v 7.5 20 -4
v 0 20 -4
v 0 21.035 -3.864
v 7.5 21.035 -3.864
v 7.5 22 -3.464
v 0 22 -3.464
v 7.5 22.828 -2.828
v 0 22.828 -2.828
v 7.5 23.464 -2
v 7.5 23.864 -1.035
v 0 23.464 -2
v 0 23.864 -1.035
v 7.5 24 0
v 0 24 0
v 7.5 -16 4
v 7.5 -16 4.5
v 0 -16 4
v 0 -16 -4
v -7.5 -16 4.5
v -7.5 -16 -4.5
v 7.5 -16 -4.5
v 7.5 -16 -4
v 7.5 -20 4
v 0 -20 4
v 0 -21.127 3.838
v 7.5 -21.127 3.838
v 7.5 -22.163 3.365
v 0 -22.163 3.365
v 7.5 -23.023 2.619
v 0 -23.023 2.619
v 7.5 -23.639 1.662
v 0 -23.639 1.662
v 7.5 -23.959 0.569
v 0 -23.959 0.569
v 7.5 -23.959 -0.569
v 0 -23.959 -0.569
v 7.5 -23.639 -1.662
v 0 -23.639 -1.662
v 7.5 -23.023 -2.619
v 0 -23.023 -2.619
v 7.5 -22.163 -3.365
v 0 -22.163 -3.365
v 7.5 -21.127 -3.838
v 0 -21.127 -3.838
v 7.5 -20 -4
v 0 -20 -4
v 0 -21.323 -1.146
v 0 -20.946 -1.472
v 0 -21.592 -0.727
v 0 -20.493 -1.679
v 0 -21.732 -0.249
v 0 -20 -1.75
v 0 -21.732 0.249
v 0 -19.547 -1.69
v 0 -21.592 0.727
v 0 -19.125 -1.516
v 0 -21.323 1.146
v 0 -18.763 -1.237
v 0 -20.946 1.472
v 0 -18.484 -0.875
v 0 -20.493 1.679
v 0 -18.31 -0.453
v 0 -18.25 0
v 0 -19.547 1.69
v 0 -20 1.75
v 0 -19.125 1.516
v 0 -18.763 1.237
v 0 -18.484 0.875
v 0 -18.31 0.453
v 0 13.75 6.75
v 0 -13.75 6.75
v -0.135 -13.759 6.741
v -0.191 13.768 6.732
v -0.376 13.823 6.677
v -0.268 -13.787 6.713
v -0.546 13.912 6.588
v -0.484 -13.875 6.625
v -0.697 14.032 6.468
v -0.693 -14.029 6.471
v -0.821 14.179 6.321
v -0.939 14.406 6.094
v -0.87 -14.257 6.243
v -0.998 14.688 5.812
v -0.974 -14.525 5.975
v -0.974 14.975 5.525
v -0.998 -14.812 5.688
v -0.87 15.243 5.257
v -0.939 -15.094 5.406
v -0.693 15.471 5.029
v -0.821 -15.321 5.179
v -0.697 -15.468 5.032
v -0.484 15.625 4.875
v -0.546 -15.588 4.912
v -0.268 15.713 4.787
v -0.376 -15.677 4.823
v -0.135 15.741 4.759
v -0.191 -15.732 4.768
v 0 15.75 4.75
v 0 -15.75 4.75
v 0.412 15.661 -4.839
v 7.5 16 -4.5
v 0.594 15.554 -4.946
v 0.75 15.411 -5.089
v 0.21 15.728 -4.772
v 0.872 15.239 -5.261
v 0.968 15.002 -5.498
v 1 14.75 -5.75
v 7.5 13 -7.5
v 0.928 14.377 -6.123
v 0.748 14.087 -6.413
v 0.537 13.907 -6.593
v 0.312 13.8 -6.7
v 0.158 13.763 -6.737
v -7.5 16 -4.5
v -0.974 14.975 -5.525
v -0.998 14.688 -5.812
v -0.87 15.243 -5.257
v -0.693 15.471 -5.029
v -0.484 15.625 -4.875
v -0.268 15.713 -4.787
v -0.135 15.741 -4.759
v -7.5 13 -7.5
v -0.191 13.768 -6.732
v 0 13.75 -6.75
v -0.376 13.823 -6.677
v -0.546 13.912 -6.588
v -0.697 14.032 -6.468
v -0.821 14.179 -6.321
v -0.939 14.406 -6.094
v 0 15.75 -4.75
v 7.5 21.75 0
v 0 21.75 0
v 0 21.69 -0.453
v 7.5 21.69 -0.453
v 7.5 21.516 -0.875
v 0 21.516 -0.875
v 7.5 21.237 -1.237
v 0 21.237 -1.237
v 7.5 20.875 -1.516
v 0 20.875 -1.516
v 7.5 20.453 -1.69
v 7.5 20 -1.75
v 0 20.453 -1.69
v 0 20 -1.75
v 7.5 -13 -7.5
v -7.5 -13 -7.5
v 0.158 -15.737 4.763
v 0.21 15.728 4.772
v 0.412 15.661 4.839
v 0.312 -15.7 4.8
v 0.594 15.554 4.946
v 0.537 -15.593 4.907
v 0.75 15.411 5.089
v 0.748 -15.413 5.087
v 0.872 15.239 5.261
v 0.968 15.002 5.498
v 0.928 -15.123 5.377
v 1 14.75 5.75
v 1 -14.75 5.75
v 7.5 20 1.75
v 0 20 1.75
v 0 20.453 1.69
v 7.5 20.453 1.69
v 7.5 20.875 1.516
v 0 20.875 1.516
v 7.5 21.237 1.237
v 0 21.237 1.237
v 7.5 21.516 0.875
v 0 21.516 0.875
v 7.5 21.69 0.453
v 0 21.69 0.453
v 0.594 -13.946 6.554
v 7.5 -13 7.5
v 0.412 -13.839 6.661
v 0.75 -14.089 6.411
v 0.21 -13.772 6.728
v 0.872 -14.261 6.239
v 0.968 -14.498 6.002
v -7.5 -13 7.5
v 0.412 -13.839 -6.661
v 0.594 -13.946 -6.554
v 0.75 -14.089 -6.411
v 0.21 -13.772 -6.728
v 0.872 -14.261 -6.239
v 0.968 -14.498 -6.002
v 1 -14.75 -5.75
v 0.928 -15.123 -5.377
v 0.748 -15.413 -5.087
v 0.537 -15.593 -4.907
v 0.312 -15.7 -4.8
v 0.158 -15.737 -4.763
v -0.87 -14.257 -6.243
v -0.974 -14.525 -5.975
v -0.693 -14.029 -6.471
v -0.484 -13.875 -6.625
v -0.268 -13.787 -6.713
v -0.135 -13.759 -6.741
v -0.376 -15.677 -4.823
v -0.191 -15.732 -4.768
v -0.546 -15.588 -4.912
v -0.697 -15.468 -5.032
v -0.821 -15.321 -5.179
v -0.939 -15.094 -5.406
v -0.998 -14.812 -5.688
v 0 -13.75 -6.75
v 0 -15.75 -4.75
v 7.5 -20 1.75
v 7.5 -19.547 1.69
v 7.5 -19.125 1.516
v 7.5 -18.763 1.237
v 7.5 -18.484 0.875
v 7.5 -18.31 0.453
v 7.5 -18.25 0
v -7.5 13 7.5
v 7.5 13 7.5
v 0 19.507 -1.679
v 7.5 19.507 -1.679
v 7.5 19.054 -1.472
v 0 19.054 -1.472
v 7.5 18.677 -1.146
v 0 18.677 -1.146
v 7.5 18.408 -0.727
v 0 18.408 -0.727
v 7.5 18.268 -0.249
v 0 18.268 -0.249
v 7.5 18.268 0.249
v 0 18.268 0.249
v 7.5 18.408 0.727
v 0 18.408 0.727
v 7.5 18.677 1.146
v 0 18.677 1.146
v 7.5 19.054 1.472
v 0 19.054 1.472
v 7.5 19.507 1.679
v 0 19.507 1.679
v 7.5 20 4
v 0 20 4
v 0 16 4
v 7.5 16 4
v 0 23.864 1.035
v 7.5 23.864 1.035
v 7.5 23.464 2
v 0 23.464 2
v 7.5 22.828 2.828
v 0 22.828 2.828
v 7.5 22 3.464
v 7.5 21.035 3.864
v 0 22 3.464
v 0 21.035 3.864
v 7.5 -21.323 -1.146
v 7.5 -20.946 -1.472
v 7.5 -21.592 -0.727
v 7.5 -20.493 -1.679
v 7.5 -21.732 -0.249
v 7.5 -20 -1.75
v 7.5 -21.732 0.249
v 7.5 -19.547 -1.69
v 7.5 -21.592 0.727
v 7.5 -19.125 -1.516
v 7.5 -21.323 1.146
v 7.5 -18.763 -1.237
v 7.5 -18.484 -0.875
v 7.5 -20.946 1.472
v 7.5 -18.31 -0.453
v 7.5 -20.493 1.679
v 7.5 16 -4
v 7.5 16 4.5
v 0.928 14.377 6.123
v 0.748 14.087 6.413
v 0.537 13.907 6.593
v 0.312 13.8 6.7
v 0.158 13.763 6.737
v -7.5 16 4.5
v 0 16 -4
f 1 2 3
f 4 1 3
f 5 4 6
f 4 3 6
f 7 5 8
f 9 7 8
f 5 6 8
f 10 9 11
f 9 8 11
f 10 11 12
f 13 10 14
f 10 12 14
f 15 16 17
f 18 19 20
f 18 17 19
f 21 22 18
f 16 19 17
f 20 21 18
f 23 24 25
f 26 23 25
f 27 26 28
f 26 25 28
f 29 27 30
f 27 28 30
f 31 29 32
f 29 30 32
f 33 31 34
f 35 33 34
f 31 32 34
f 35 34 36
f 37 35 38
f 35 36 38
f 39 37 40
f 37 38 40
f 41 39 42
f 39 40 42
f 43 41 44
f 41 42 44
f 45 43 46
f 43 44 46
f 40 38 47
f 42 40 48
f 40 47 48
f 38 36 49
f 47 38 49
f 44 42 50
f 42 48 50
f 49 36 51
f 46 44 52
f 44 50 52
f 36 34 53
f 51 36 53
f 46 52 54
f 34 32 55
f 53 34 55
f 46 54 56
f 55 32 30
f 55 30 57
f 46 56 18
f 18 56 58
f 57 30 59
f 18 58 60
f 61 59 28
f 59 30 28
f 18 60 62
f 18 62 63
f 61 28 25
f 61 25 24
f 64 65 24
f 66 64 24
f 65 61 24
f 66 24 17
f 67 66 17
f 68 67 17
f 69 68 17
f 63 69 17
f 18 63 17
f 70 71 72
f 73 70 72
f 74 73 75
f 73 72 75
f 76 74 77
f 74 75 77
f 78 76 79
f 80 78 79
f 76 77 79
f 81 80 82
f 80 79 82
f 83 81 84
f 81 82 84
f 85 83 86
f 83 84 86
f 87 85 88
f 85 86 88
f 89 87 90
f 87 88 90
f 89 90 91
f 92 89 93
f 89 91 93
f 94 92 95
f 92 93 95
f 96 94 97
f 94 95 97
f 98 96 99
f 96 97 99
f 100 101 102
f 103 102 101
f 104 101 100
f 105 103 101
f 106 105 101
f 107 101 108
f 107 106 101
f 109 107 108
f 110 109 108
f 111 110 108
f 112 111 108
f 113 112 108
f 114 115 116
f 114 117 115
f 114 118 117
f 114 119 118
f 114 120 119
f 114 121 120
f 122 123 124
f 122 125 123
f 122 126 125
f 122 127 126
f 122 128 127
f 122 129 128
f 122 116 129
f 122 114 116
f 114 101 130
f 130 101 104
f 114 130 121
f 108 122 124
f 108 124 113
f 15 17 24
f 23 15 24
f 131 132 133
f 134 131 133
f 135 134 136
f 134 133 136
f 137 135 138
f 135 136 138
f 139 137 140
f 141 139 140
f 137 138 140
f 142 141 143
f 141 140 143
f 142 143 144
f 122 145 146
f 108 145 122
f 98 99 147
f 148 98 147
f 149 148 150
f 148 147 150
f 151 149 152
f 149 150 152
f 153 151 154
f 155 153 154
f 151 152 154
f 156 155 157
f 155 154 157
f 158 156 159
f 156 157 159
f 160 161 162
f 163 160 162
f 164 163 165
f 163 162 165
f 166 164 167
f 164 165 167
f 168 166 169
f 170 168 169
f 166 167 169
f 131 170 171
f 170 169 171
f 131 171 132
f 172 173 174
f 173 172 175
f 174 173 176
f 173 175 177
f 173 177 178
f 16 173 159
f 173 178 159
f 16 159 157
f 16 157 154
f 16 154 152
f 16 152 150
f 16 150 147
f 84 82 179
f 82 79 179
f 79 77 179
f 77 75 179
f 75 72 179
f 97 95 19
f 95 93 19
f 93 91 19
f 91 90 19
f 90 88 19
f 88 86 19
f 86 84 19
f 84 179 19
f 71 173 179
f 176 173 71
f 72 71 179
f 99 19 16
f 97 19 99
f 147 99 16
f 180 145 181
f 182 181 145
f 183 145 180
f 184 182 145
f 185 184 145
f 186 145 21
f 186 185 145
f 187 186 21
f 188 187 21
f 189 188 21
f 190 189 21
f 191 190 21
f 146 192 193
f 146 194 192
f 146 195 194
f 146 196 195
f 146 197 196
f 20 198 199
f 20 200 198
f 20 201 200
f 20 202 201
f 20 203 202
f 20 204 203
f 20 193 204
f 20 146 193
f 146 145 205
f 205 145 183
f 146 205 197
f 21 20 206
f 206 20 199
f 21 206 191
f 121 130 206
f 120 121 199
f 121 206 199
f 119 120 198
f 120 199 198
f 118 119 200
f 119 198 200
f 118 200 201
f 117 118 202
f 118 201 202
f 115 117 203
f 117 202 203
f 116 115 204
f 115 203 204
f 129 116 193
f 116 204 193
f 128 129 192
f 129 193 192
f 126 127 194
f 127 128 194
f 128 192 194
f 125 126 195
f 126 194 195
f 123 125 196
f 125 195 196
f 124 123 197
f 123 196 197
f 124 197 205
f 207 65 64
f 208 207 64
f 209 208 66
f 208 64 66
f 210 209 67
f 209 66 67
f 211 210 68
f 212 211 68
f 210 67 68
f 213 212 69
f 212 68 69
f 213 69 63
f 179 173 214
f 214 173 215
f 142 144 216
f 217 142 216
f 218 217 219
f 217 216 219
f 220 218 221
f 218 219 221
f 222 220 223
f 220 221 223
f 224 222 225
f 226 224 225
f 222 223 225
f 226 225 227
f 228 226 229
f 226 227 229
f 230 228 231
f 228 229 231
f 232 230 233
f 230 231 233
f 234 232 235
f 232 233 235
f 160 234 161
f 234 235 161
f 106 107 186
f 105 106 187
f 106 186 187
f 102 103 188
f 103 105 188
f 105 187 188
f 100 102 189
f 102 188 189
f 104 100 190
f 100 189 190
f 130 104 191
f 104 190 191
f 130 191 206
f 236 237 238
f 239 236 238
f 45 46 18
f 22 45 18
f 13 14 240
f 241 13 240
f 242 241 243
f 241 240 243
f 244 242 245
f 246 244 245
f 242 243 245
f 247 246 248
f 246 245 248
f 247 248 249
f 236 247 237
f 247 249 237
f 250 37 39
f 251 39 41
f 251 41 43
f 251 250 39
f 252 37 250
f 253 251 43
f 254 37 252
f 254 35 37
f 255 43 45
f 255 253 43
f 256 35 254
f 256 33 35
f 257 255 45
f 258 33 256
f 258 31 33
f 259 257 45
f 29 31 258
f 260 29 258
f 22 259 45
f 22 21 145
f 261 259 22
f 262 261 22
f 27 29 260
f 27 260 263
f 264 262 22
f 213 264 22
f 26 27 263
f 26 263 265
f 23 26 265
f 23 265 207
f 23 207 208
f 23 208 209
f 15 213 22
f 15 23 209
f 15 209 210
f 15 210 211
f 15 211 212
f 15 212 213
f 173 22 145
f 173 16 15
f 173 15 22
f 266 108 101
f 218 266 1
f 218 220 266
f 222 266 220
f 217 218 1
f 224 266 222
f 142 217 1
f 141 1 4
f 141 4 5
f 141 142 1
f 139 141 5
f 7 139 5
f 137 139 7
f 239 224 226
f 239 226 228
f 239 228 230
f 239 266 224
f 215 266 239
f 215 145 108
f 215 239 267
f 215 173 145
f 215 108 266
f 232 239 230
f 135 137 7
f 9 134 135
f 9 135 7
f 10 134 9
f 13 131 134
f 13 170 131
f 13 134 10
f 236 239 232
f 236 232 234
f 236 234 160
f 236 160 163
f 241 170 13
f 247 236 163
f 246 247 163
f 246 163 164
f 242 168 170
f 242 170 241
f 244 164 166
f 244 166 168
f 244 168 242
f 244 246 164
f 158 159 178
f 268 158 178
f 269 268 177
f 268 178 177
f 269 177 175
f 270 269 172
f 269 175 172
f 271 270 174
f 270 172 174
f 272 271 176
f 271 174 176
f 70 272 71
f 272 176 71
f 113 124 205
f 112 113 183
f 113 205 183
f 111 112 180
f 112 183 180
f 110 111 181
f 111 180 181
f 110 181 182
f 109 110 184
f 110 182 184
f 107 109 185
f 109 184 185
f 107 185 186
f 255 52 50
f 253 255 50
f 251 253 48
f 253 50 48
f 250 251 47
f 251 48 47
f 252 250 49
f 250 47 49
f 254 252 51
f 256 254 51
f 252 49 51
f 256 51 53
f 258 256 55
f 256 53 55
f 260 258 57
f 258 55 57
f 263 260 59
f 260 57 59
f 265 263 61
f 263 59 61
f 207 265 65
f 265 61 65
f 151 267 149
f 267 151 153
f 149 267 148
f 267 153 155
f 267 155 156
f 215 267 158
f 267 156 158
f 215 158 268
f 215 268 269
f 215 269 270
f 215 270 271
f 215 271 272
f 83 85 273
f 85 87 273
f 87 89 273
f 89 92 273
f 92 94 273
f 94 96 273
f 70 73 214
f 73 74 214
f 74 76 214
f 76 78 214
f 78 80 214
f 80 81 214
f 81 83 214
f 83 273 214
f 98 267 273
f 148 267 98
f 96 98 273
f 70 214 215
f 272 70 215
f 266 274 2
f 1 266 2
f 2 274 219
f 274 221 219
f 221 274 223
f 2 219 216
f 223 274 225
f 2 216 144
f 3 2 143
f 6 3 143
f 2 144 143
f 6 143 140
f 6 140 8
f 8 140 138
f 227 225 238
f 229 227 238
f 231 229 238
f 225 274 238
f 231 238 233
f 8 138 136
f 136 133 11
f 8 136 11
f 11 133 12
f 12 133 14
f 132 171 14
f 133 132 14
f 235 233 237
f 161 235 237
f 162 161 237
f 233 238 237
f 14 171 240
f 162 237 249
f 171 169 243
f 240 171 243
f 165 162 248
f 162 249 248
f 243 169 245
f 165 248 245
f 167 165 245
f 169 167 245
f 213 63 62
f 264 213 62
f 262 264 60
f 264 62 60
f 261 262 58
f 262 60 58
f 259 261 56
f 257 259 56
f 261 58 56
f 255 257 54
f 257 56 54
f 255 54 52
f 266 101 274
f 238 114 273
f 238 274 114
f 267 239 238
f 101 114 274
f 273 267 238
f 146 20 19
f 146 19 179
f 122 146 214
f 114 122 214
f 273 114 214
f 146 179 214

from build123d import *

# Parameters (mm, degrees)
F0_W        = 32
F0_H        = 3.5
F1_DEPTH    = 7.5
F2_DEPTH    = 7.5
F4_DEPTH    = 40
F5_T1_DEPTH = 30.4300979278


# Not quite as in the source:
# - a fillet or chamfer that OpenCascade refuses, or shapes differently, is made with other operations: its cross-section is extruded or revolved along the edge and cut away or added


with BuildPart() as f1:
    # F0 (on Right) → F1 (new body, symmetric)
    with BuildSketch(Plane.YZ):
        with Locations((0, -5.75)):
            Rectangle(F0_W, F0_H)
        Polygon((16, 0), (16, 4), (-16, 4), (-16, 0), (-16, -4), (16, -4), align=None)
        with Locations((0, 5.75)):
            Rectangle(F0_W, F0_H)
    extrude(amount=F1_DEPTH, both=True)

    # F0 (on Right) → F2 (join)
    with BuildSketch(Plane.YZ):
        with BuildLine():
            Line((-16, -4), (-16, 0))
            ThreePointArc((-16, 0), (-17.1715728753, -2.8284271247), (-20, -4))
            Line((-20, -4), (-16, -4))
        make_face()
        with BuildLine():
            ThreePointArc((-16, 0), (-17.1715728753, 2.8284271247), (-20, 4))
            Line((-20, 4), (-20, 1.75))
            ThreePointArc((-20, 1.75), (-18.7625631329, 1.2374368671), (-18.25, 0))
            ThreePointArc((-18.25, 0), (-18.7625631329, -1.2374368671), (-20, -1.75))
            Line((-20, -1.75), (-20, -4))
            ThreePointArc((-20, -4), (-17.1715728753, -2.8284271247), (-16, 0))
        make_face()
        with BuildLine():
            Line((-16, 0), (-16, 4))
            Line((-16, 4), (-20, 4))
            ThreePointArc((-20, 4), (-17.1715728753, 2.8284271247), (-16, 0))
        make_face()
        with BuildLine():
            Line((-20, 1.75), (-20, 4))
            ThreePointArc((-20, 4), (-24, 0), (-20, -4))
            Line((-20, -4), (-20, -1.75))
            ThreePointArc((-20, -1.75), (-21.75, 0), (-20, 1.75))
        make_face()
        with BuildLine():
            Line((20, 1.75), (20, 4))
            ThreePointArc((20, 4), (17.1715728753, 2.8284271247), (16, 0))
            ThreePointArc((16, 0), (17.1715728753, -2.8284271247), (20, -4))
            Line((20, -4), (20, -1.75))
            ThreePointArc((20, -1.75), (18.25, 0), (20, 1.75))
        make_face()
        with BuildLine():
            ThreePointArc((16, 0), (17.1715728753, 2.8284271247), (20, 4))
            Line((20, 4), (16, 4))
            Line((16, 4), (16, 0))
        make_face()
        with BuildLine():
            ThreePointArc((20, -4), (17.1715728753, -2.8284271247), (16, 0))
            Line((16, 0), (16, -4))
            Line((16, -4), (20, -4))
        make_face()
        with BuildLine():
            ThreePointArc((24, 0), (22.8284271247, 2.8284271247), (20, 4))
            Line((20, 4), (20, 1.75))
            ThreePointArc((20, 1.75), (21.2374368671, 1.2374368671), (21.75, 0))
            ThreePointArc((21.75, 0), (21.2374368671, -1.2374368671), (20, -1.75))
            Line((20, -1.75), (20, -4))
            ThreePointArc((20, -4), (22.8284271247, -2.8284271247), (24, 0))
        make_face()
    extrude(amount=F2_DEPTH)

    # F3 (on face) → F4 (cut)
    with BuildSketch(Plane.XZ.offset(16)):
        with BuildLine():
            ThreePointArc((1, 5.75), (0.7071067812, 6.4571067812), (0, 6.75))
            Line((0, 6.75), (0, 4.75))
            ThreePointArc((0, 4.75), (0.7071067812, 5.0428932188), (1, 5.75))
        make_face()
        with BuildLine():
            Line((0, 4.75), (0, 6.75))
            ThreePointArc((0, 6.75), (-1, 5.75), (0, 4.75))
        make_face()
        with BuildLine():
            ThreePointArc((1, -5.75), (0.7071067812, -5.0428932188), (0, -4.75))
            Line((0, -4.75), (0, -6.75))
            ThreePointArc((0, -6.75), (0.7071067812, -6.4571067812), (1, -5.75))
        make_face()
        with BuildLine():
            Line((0, -6.75), (0, -4.75))
            ThreePointArc((0, -4.75), (-1, -5.75), (0, -6.75))
        make_face()
    extrude(amount=-F4_DEPTH, mode=Mode.SUBTRACT)

    # F5: chamfer of 3 on 4 edges, made by hand

    # F5_s2 → F5_t1 (cut)
    with BuildSketch(Plane.YZ.offset(-15.2150489639)):
        Polygon((-13, 7.5), (-16, 4.5), (-16, 7.5), align=None)
        Polygon((-13, -7.5), (-16, -4.5), (-16, -7.5), align=None)
        Polygon((16, 4.5), (13, 7.5), (16, 7.5), align=None)
        Polygon((16, -4.5), (13, -7.5), (16, -7.5), align=None)
    extrude(amount=F5_T1_DEPTH, mode=Mode.SUBTRACT)


solid = f1.part
